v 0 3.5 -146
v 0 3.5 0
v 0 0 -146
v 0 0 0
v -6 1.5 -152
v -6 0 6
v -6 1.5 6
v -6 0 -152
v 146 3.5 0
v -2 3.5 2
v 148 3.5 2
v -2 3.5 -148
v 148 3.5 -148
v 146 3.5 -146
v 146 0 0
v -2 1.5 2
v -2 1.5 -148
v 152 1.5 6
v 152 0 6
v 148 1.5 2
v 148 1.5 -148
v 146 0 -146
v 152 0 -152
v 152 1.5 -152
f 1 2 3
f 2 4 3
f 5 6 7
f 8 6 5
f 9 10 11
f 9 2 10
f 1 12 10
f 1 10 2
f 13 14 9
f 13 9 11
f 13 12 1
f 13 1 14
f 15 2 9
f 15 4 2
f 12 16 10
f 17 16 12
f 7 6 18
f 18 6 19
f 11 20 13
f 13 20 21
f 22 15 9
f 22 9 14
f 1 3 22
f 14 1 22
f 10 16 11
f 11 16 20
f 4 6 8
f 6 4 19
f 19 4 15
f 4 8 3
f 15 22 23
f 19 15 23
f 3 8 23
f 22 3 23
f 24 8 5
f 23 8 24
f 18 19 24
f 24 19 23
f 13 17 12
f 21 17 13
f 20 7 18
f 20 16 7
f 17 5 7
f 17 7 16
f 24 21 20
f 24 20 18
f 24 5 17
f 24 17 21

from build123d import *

# Parameters (mm, degrees)
CROQUIS1_W              = 158
CROQUIS1_H              = 158
CROQUIS1_W_2            = 146
CROQUIS1_H_2            = 146
SALIENTE_EXTRUIR1_DEPTH = 1.5
CROQUIS2_W              = 150
CROQUIS2_H              = 150
CROQUIS2_W_2            = 146
CROQUIS2_H_2            = 146
SALIENTE_EXTRUIR2_DEPTH = 2


with BuildPart() as part:
    # Croquis1 → Saliente-Extruir1 (new body)
    with BuildSketch(Plane(origin=(0, 0, 0), x_dir=(1, 0, 0), z_dir=(0, 1, 0))):
        with Locations((73, 73)):
            Rectangle(CROQUIS1_W, CROQUIS1_H)
        with Locations((73, 73)):
            Rectangle(CROQUIS1_W_2, CROQUIS1_H_2, mode=Mode.SUBTRACT)
    extrude(amount=SALIENTE_EXTRUIR1_DEPTH)

    # Croquis2 → Saliente-Extruir2 (add)
    with BuildSketch(Plane(origin=(0, 1.5, 0), x_dir=(1, 0, 0), z_dir=(0, 1, 0))):
        with Locations((73, 73)):
            Rectangle(CROQUIS2_W, CROQUIS2_H)
        with Locations((73, 73)):
            Rectangle(CROQUIS2_W_2, CROQUIS2_H_2, mode=Mode.SUBTRACT)
    extrude(amount=SALIENTE_EXTRUIR2_DEPTH)


solid = part.part
